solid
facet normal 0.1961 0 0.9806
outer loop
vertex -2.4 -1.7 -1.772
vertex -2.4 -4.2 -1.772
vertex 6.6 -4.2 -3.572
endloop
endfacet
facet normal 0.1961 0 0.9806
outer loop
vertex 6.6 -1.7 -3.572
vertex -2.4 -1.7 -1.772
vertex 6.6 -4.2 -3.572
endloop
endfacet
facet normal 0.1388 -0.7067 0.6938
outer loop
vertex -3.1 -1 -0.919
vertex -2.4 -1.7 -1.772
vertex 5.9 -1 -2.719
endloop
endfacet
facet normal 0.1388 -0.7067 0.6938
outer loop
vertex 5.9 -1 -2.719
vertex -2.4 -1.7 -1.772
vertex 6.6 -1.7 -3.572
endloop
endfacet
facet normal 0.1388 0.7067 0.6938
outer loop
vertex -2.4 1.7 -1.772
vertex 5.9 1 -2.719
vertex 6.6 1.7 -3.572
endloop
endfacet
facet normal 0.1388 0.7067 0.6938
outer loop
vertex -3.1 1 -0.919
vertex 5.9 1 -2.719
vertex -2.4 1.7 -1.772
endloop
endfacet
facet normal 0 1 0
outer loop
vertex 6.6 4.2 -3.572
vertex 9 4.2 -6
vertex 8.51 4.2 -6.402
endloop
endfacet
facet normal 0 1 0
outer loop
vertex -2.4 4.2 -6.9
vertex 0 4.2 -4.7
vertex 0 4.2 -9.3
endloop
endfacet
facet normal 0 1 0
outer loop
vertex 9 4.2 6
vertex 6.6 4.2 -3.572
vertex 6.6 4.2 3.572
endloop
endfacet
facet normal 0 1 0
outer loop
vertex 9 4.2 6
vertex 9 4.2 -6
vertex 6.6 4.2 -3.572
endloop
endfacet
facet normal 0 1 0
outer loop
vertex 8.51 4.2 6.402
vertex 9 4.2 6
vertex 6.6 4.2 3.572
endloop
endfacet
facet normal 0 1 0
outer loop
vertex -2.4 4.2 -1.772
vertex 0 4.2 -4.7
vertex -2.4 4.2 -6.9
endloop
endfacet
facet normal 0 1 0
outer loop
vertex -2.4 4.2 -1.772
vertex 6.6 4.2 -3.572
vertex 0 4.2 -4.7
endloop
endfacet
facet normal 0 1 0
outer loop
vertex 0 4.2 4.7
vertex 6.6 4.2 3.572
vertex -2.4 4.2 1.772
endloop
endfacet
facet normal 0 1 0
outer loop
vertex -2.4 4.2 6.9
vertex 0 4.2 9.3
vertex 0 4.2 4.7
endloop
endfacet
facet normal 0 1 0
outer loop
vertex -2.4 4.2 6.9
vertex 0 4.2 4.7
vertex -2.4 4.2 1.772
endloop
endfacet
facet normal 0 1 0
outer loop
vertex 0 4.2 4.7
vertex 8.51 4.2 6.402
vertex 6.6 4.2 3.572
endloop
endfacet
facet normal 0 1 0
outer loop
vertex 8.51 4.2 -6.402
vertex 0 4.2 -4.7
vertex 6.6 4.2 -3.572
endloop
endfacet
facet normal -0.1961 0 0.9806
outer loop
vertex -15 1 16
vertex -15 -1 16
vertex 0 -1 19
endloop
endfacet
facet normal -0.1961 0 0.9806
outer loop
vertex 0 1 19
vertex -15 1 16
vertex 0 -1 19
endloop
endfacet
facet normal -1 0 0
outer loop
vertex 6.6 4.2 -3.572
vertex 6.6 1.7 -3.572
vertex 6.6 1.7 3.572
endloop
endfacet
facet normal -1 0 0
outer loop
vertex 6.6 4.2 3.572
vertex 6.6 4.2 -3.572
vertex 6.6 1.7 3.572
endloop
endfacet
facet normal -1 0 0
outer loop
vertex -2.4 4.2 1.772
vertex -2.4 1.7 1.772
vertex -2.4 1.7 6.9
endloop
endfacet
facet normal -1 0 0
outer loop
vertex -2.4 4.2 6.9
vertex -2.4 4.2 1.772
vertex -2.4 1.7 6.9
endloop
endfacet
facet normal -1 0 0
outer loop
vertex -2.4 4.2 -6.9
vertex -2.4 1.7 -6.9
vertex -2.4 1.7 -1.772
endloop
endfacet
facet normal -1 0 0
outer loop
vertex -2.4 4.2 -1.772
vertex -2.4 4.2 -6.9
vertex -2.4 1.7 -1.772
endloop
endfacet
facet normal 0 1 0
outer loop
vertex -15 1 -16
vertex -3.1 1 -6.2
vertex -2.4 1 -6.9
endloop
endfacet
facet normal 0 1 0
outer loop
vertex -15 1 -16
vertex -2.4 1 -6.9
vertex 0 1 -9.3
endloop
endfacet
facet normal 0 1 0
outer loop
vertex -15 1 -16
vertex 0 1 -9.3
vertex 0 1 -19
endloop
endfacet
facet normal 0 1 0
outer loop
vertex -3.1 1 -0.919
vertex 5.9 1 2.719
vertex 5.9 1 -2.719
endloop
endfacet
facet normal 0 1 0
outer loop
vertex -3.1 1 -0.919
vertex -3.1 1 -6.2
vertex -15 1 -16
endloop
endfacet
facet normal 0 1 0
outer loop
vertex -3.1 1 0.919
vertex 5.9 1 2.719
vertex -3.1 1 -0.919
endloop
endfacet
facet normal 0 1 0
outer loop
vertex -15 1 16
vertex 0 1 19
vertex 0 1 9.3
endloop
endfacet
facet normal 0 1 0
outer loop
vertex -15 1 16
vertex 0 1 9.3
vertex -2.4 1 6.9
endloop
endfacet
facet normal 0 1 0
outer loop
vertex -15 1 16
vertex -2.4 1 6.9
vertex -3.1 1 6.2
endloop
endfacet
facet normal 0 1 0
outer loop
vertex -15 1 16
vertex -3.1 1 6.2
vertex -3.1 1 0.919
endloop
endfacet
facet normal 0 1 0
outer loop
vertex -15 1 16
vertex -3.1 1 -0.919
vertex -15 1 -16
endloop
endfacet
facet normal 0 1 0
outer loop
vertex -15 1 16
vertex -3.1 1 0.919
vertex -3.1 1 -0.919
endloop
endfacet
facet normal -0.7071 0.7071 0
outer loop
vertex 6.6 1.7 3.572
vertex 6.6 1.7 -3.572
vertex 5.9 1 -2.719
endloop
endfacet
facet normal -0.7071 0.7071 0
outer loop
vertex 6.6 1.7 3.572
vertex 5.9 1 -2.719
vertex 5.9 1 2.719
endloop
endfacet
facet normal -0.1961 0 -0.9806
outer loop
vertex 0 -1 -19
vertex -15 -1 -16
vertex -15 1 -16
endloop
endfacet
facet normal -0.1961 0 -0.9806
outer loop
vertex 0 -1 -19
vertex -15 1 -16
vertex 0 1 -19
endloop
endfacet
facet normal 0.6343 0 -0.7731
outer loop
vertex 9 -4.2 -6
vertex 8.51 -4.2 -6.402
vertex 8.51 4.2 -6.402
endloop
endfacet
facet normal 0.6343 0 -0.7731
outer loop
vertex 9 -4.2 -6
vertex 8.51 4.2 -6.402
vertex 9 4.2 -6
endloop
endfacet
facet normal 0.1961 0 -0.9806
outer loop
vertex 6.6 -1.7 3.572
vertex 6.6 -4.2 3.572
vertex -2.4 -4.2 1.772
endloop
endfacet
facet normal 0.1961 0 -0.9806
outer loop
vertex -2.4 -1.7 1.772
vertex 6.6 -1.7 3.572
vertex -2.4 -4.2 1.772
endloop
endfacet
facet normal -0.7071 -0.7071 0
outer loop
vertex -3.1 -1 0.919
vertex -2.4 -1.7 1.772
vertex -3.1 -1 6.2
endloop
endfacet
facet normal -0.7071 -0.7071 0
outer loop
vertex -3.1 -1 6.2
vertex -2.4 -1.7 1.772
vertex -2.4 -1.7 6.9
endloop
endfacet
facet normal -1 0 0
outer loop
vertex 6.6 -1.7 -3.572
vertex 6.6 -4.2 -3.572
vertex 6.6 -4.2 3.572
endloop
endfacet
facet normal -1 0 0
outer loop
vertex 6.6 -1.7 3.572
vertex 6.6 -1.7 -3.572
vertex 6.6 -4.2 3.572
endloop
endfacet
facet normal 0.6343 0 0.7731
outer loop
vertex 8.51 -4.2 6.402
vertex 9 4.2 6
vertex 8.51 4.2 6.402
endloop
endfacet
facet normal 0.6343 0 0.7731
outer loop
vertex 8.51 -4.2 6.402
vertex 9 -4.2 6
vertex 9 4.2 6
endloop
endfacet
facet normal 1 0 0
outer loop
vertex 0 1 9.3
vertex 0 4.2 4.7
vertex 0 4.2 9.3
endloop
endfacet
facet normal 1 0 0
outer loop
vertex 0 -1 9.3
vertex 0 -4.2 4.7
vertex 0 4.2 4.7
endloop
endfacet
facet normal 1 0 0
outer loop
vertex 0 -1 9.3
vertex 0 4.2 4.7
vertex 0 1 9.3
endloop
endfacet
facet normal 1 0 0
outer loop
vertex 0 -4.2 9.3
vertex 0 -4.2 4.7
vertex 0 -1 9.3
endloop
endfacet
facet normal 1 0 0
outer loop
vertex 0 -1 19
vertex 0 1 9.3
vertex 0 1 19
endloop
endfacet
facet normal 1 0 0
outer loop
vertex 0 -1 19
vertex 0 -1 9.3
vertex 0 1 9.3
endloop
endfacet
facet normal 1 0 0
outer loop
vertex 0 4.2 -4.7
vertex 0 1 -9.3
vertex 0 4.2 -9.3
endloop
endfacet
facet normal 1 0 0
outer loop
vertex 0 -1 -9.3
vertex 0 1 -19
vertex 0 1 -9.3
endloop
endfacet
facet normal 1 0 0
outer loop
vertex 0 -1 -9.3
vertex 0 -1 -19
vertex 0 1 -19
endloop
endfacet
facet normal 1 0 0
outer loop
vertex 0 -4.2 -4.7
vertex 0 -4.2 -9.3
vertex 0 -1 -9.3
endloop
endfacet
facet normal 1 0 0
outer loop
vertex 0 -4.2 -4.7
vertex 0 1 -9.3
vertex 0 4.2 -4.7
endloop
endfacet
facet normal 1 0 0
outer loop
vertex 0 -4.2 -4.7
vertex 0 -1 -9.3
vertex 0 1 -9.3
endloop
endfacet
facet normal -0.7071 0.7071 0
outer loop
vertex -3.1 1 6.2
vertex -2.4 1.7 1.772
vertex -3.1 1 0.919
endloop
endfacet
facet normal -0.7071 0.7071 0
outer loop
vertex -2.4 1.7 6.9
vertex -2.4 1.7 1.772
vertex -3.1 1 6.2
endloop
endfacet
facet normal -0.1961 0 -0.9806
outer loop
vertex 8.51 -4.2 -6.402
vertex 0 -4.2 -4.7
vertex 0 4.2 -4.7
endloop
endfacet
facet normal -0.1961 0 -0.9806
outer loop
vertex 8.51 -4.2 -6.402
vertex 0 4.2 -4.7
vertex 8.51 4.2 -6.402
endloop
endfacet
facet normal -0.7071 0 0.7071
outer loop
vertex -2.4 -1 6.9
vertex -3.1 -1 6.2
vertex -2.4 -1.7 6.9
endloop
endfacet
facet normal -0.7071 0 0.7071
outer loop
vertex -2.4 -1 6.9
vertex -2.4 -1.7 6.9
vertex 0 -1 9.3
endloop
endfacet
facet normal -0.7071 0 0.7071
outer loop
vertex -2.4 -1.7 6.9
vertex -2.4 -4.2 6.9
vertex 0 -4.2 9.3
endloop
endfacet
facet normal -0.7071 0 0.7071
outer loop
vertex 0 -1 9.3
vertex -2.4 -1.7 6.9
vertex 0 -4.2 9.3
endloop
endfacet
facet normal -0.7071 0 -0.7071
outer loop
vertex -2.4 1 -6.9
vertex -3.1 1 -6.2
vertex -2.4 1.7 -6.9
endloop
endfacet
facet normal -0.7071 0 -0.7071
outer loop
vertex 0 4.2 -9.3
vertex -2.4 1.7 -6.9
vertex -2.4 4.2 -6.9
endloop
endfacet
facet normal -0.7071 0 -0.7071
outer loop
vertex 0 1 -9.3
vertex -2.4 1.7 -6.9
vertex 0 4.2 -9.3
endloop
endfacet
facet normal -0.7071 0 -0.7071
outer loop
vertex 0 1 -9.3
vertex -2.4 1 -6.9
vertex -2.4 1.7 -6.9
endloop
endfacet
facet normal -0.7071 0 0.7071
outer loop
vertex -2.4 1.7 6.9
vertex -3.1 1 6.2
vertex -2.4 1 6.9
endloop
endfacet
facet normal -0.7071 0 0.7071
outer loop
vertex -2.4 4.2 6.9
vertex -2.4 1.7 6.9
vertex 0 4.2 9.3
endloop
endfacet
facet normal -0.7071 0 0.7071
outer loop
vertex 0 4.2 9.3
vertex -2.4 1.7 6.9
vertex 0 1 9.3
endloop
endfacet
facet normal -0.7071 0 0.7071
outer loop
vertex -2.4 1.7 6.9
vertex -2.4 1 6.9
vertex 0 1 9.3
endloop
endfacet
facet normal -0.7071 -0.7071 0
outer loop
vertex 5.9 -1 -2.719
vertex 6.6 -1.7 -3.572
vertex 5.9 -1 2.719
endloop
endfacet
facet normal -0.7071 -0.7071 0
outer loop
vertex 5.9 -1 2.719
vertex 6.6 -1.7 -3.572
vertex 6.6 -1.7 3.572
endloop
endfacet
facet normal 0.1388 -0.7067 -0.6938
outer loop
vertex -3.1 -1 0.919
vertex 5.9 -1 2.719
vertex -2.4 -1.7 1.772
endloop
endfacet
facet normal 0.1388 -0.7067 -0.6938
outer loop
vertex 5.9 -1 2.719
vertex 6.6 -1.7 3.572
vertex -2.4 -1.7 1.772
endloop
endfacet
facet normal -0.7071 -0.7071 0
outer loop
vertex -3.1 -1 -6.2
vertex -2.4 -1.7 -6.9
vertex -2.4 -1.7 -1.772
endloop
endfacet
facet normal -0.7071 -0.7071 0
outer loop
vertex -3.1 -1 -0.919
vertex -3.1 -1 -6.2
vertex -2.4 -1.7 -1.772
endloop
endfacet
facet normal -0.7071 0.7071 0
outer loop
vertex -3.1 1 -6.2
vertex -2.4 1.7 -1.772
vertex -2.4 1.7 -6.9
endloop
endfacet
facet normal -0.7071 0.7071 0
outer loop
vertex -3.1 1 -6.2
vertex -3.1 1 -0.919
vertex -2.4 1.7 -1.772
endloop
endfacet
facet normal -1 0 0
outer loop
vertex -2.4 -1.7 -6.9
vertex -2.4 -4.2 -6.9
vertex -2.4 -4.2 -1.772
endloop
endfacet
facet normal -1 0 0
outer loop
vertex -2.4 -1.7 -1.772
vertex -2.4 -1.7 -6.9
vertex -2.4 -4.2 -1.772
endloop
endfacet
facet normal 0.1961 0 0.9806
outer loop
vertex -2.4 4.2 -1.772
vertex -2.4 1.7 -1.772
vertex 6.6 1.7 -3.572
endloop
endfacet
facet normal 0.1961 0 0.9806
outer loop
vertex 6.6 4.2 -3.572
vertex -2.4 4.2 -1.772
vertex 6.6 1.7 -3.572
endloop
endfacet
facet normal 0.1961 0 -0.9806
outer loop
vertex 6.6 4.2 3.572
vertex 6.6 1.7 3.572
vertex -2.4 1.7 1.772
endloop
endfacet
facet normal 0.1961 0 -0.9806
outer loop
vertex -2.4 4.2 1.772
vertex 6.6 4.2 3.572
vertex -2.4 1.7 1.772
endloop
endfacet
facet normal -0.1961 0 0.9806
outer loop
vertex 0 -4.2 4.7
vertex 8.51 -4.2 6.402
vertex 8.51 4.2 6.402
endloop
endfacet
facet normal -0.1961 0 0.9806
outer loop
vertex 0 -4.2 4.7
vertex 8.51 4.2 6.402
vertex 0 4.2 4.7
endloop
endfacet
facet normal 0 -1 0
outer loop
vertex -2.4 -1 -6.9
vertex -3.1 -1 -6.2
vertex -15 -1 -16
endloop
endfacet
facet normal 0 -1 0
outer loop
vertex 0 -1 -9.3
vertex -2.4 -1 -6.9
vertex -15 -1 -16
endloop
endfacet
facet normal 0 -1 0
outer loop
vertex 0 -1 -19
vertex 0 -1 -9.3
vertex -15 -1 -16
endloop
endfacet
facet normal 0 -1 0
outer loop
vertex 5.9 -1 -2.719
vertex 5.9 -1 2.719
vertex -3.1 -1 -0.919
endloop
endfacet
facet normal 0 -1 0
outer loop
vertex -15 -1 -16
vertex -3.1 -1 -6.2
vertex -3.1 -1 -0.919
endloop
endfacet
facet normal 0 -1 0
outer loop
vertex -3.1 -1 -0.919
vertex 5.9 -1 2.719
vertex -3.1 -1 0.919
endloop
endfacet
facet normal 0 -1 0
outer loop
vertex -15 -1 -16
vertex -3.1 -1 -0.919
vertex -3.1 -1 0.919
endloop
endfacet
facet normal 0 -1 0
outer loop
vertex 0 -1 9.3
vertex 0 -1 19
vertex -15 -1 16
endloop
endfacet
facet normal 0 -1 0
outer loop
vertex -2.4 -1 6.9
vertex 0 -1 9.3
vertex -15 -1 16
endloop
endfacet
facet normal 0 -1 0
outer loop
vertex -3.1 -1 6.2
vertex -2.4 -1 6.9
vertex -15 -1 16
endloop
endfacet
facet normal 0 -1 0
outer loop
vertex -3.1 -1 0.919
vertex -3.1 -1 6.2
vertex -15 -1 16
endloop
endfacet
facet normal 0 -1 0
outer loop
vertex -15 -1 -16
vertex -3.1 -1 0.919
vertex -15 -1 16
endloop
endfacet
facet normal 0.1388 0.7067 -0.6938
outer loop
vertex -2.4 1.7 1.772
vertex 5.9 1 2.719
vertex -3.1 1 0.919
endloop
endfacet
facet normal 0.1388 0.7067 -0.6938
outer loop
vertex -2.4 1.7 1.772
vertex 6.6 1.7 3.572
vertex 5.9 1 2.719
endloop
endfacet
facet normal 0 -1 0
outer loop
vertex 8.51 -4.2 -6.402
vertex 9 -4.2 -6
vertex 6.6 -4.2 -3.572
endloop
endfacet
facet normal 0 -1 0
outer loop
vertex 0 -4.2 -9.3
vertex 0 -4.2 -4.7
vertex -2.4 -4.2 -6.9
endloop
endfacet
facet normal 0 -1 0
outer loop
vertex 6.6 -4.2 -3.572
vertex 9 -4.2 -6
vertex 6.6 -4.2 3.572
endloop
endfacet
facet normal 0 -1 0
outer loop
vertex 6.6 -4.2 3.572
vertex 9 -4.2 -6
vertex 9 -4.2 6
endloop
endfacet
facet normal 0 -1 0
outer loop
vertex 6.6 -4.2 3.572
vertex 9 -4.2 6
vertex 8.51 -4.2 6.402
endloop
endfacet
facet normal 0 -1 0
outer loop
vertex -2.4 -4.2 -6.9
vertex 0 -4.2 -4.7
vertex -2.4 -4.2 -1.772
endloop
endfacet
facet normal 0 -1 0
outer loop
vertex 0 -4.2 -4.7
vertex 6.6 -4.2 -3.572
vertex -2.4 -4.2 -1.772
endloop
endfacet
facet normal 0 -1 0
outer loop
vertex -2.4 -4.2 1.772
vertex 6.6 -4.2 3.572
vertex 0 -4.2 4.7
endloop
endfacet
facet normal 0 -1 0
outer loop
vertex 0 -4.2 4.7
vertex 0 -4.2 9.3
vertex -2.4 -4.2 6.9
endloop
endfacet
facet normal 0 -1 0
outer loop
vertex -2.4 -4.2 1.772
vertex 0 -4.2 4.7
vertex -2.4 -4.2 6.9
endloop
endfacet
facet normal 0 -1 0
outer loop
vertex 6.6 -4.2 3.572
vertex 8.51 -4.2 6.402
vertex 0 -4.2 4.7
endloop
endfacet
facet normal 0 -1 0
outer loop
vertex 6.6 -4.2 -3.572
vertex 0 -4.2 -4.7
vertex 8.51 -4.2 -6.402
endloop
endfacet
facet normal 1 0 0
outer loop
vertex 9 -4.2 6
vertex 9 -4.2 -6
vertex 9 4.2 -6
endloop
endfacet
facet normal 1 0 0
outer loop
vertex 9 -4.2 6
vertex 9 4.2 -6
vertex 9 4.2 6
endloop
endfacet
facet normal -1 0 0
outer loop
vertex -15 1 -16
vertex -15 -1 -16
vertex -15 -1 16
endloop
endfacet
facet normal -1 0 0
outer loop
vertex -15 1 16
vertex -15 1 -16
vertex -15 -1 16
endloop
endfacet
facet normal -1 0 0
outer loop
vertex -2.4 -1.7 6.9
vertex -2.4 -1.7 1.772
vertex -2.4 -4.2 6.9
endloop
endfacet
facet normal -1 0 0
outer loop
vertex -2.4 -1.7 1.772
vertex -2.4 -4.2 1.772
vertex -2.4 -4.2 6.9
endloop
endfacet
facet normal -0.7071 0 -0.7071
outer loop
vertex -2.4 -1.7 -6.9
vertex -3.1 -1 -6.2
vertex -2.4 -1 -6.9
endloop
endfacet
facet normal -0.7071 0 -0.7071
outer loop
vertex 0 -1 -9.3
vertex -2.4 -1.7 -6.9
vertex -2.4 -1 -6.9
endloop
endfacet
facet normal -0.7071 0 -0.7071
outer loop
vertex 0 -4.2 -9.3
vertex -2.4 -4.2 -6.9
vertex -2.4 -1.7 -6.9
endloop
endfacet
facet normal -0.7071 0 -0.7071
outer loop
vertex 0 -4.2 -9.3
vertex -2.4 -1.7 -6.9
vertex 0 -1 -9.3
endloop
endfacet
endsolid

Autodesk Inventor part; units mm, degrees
ref_plane "YZ Plane" through (0, 0, 0) normal (1, 0, 0) x (0, 1, 0)
ref_plane "BackFace" through (0, -1, 0) normal (0, 1, 0) x (-1, 0, 0)
ref_plane "BottomFace" through (0, -4.2, 0) normal (0, 1, 0) x (-1, 0, 0)
sketch "FemaleOutline" plane through (0, 0, 0) normal (0, 1, 0) x (-1, 0, 0)
  line L0 (0, -26.6) -> (0, 26.6) projected
  line L1 (-3, 0) -> (18, 0) projected
  line L2 (0.4908, -4.8956) -> (9.5, -6.65)
  line L3 (9.5, -6.65) -> (9.5, 6.65)
  line L4 (9.5, 6.65) -> (0.4908, 4.8956)
  line L5 (0, -19) -> (0, -5.3)
  line L6 (0, 5.3) -> (0, 19)
  line L7 (2.4, -6.9) -> (11.5, -6.9)
  line L8 (11.5, -6.9) -> (11.5, 6.9)
  line L9 (11.5, 6.9) -> (2.4, 6.9)
  line L10 (2.4, -6.9) -> (0, -9.3)
  line L11 (2.4, 6.9) -> (0, 9.3)
  line L12 (15, -16) -> (15, 16)
  line L13 (15, 16) -> (0, 19)
  line L14 (15, -16) -> (0, -19)
  line L15 (0.4908, 4.8956) -> (0, 5.3)
  line L16 (0.4908, -4.8956) -> (0, -5.3)
  point P0 (0, 0)
  point P1 (0, -4.8)
  point P2 (0, 4.8)
  point P3 (0, 9.3)
  point P4 (0, 4.8)
  point P5 (0, -4.8)
  point P6 (0, -9.3)
  point P7 (0, -5.3)
  point P8 (0, 5.3)
  dimension "d3" = 13.3
  dimension "d5" = 9.6
  dimension "d14" = 2
  dimension "d63" = 2.4
  dimension "d64" = 18.6
  dimension "d65" = 15
  dimension "d74" = 38
  dimension "d75" = 3
  dimension "d93" = 9.5
  dimension "d94" = 2.4
  dimension "d95" = 0.5
  dimension "d96" = 0.5
  dimension "d97" = 0.5
  dimension "d98" = 0.5
sketch "MaleOutline" plane through (0, 0, 0) normal (0, 1, 0) x (-1, 0, 0)
  line L0 (0, -4.7) -> (-8.5097, -6.4019)
  line L1 (-9, -6) -> (-9, 6)
  line L2 (-8.5097, 6.4019) -> (0, 4.7)
  line L3 (0, -19) -> (0, -4.7)
  line L4 (0, 4.7) -> (0, 19)
  line L5 (2.4, -1.7725) -> (-6.6, -3.5725)
  line L6 (-6.6, -3.5725) -> (-6.6, 3.5725)
  line L7 (-6.6, 3.5725) -> (2.4, 1.7725)
  line L8 (2.4, -6.9) -> (2.4, -1.7725)
  line L9 (2.4, 1.7725) -> (2.4, 6.9)
  line L10 (2.4, -6.9) -> (0, -9.3)
  line L11 (2.4, 6.9) -> (0, 9.3)
  line L12 (15, -16) -> (15, 16)
  line L13 (15, 16) -> (0, 19)
  line L14 (15, -16) -> (0, -19)
  line L15 (0, -26.6) -> (0, 26.6) projected
  line L16 (-13.8, 0) -> (19.8, 0) projected
  line L17 (-8.5097, -6.4019) -> (-9, -6)
  line L18 (-9, 6) -> (-8.5097, 6.4019)
  point P0 (-9, -6.5)
  point P1 (-9, 6.5)
  dimension "d99" = 9
  dimension "d100" = 13
  dimension "d101" = 9.4
  dimension "d102" = 2.4
  dimension "d103" = 2.4
  dimension "d104" = 2.4
  dimension "d105" = 2.4
  dimension "d106" = 2.4
  dimension "d107" = 18.6
  dimension "d109" = 38
  dimension "d110" = 3
  dimension "d120" = 15
  dimension "d128" = 0.5
  dimension "d129" = 0.5
  dimension "d130" = 0.5
  dimension "d131" = 0.5
sketch "DipOutline" plane through (0, -1, 0) normal (0, 1, 0) x (-1, 0, 0)
  line L0 (0, -120.0212) -> (0, 93.8212) projected
  line L1 (-3, 0) -> (18, 0) projected
  line L2 (0, 19) -> (15, 16)
  line L3 (15, 16) -> (15, -16)
  line L4 (15, -16) -> (0, -19)
  line L5 (0, -19) -> (0, 19)
  line L6 (0, 19) -> (0, 4.7)
  line L7 (10.95, -6.3) -> (14.95, -6.3)
  line L8 (14.95, -6.3) -> (14.95, -2.6)
  line L9 (14.95, -2.6) -> (10.95, -2.6)
  line L10 (10.95, -2.6) -> (10.95, -6.3)
  line L11 (14.95, -15.85) -> (14.95, -10.35)
  arc A0 (14.95, -10.35) -> (0, -8.95) centre (0, -89.4723) ccw
  arc A1 (0, -17.25) -> (14.95, -15.85) centre (0, 63.2723) ccw
  line L12 (9.5, 0) -> (9.5, -6.9)
  line L13 (9.5, -6.9) -> (0, -6.9)
  line L14 (0, -8.45) -> (0.5, -8.9516)
  line L15 (0, -17.75) -> (0.5, -17.2484)
  point P0 (0, -17.25)
  point P1 (15, 0)
  point P2 (0, 0)
  point P3 (0, -8.95)
  dimension "d133" = 15
  dimension "d134" = 38
  dimension "d135" = 3
  dimension "d146" = 3.7
  dimension "d147" = 6.3
  dimension "d148" = 2.6
  dimension "d151" = 14.95
  dimension "d152" = 4
  dimension "d153" = 5.5
  dimension "d154" = 8.3
  dimension "d155" = 17.25
  dimension "d160" = 6.9
  dimension "d161" = 9.5
  dimension "d196" = 0.5
  dimension "d197" = 0.5
  dimension "d198" = 0.5
  dimension "d199" = 0.5
sketch "DipSupport" plane through (0, -4.2, 0) normal (0, 1, 0) x (-1, 0, 0)
  line L0 (0, -20.94) -> (0, 3.49) projected
  line L1 (-5.0794, 0) -> (17.4132, 0) projected
  line L2 (-1.8662, -13.1) -> (-0.8497, -13.1)
  line L3 (0, -9.95) -> (0, -16.25)
  line L4 (0, -16.25) -> (0.6, -16.25)
  line L5 (0.6, -16.25) -> (0.6, -15.5)
  line L6 (0.6, -14.8486) -> (0.6, -13.35)
  line L7 (0.6, -13.35) -> (13.117, -13.35)
  line L8 (13.117, -13.35) -> (13.4421, -13.9987)
  line L9 (13.4421, -13.9987) -> (0.6, -14.8486)
  line L10 (0.6, -12.85) -> (13.117, -12.85)
  line L11 (13.117, -12.85) -> (13.4421, -12.2013)
  line L12 (13.4421, -12.2013) -> (0.6, -11.3514)
  line L13 (0.6, -11.3514) -> (0.6, -12.85)
  line L14 (0, -9.95) -> (0.6, -9.95)
  line L15 (0.6, -9.95) -> (0.6, -10.7)
  line L16 (0, -9.95) -> (0, -8.75)
  line L17 (0, -8.75) -> (0.3, -8.75)
  line L18 (0.3, -8.75) -> (0.6, -9.05)
  line L19 (0.6, -9.05) -> (0.6, -9.95)
  line L20 (0, -16.25) -> (0, -17.45)
  line L21 (0.3, -17.45) -> (0.6, -17.15)
  line L22 (0.6, -17.15) -> (0.6, -16.25)
  line L23 (0, -17.45) -> (0.3, -17.45)
  line L24 (0.6, -15.5) -> (14.2, -14.6)
  line L25 (14.2, -14.6) -> (14.2, -13.9486)
  line L26 (14.2, -13.9486) -> (13.9, -13.35)
  line L27 (13.9, -13.35) -> (13.9, -12.85)
  line L28 (13.9, -12.85) -> (14.2, -12.2514)
  line L29 (14.2, -12.2514) -> (14.2, -11.6)
  line L30 (14.2, -11.6) -> (0.6, -10.7)
  line L31 (0, -9.95) -> (0, -8.75)
  line L32 (0, -16.25) -> (0, -17.45)
  point P0 (0, 0)
  point P1 (0, -17.25)
  point P2 (0, -8.95)
  dimension "d169" = 0.5
  dimension "d171" = 4.8
  dimension "d181" = 4.15
  dimension "d182" = 4.15
  dimension "d183" = 0.2
  dimension "d184" = 1
  dimension "d185" = 0.3
  dimension "d186" = 0.6
  dimension "d187" = 45
  dimension "d188" = 14.2
  dimension "d189" = 3
  dimension "d190" = 0.65
  dimension "d191" = 0.3
  dimension "d193" = 0.7
extrude "Female1" [suppressed]
extrude "Female2" [suppressed]
chamfer "FemaleC" [suppressed]
extrude "FemaleFill" [suppressed]
extrude "Male1" add sketch "MaleOutline" along normal mid plane 8.4 separate body contours L15 L5 L8 L10 L3 | L0 L17 L1 L16 L6 L5 L15 | L1 L18 L2 L15 L7 L6 L16 | L15 L4 L11 L9 L7
extrude "Male2" add sketch "MaleOutline" along normal mid plane 2 contours L10 L8 L5 L15 L16 L12 L14 L3 | L5 L6 L16 L15 | L16 L6 L7 L15 | L15 L7 L9 L11 L4 L13 L12 L16
chamfer "MaleC" distance 0.7 angle 45 10 edges at (2.1, 1, -2.6725) (2.1, 1, 2.6725) (6.6, 1, 0) (2.1, -1, 2.6725) (6.6, -1, 0) (2.1, -1, -2.6725) (-2.4, -1, 4.3362) (-2.4, -1, -4.3362) (-2.4, 1, 4.3362) (-2.4, 1, -4.3362)
extrude "MaleFill" [suppressed]
extrude "JointDip" [suppressed]
extrude "JointDipSup1" [suppressed]
extrude "JointDipSup2" [suppressed]
mirror "JointDipM" [suppressed]
mirror "JointDipSupM" [suppressed]
sketch "PrintTab" plane through (0, -4.2, 0) normal (0, 1, 0) x (-1, 0, 0)
  line L0 (0, -30.8) -> (0, 30.8) projected
  line L1 (-10.4076, 0) -> (1.7346, 0) projected
  line L2 (0, -19) -> (0, -17)
  line L3 (0, 17) -> (0, 19)
  line L4 (0, 19) -> (-0.8, 19)
  line L5 (0, 17) -> (-0.8, 17)
  line L6 (0, -17) -> (-0.8, -17)
  line L7 (0, -19) -> (-0.8, -19)
  line L8 (-0.8, -19) -> (-0.8, -17)
  line L9 (-0.8, 17) -> (-0.8, 19)
  arc A0 (-0.8, 19) -> (-0.8, 17) centre (-4.673, 18) ccw
  arc A1 (-0.8, -17) -> (-0.8, -19) centre (-4.673, -18) ccw
  point P0 (0, 0)
  dimension "d208" = 2
  dimension "d209" = 38
  dimension "d216" = 0.8
  dimension "d217" = 4
extrude "PrintTab1" [suppressed]
extrude "PrintTab2" [suppressed]
equation "\"d19\" = RailHeight"
equation "\"rib\" = 0.65"
equation "\"gap\" = 0.2"
equation "\"d118\" = 0"
equation "\"d143\" = 0"
equation "\"d178\" = 0.5"
equation "\"RailHeight\" = 8.4"
properties part number "MaleDoubleSide" material "ABS プラスチック"
